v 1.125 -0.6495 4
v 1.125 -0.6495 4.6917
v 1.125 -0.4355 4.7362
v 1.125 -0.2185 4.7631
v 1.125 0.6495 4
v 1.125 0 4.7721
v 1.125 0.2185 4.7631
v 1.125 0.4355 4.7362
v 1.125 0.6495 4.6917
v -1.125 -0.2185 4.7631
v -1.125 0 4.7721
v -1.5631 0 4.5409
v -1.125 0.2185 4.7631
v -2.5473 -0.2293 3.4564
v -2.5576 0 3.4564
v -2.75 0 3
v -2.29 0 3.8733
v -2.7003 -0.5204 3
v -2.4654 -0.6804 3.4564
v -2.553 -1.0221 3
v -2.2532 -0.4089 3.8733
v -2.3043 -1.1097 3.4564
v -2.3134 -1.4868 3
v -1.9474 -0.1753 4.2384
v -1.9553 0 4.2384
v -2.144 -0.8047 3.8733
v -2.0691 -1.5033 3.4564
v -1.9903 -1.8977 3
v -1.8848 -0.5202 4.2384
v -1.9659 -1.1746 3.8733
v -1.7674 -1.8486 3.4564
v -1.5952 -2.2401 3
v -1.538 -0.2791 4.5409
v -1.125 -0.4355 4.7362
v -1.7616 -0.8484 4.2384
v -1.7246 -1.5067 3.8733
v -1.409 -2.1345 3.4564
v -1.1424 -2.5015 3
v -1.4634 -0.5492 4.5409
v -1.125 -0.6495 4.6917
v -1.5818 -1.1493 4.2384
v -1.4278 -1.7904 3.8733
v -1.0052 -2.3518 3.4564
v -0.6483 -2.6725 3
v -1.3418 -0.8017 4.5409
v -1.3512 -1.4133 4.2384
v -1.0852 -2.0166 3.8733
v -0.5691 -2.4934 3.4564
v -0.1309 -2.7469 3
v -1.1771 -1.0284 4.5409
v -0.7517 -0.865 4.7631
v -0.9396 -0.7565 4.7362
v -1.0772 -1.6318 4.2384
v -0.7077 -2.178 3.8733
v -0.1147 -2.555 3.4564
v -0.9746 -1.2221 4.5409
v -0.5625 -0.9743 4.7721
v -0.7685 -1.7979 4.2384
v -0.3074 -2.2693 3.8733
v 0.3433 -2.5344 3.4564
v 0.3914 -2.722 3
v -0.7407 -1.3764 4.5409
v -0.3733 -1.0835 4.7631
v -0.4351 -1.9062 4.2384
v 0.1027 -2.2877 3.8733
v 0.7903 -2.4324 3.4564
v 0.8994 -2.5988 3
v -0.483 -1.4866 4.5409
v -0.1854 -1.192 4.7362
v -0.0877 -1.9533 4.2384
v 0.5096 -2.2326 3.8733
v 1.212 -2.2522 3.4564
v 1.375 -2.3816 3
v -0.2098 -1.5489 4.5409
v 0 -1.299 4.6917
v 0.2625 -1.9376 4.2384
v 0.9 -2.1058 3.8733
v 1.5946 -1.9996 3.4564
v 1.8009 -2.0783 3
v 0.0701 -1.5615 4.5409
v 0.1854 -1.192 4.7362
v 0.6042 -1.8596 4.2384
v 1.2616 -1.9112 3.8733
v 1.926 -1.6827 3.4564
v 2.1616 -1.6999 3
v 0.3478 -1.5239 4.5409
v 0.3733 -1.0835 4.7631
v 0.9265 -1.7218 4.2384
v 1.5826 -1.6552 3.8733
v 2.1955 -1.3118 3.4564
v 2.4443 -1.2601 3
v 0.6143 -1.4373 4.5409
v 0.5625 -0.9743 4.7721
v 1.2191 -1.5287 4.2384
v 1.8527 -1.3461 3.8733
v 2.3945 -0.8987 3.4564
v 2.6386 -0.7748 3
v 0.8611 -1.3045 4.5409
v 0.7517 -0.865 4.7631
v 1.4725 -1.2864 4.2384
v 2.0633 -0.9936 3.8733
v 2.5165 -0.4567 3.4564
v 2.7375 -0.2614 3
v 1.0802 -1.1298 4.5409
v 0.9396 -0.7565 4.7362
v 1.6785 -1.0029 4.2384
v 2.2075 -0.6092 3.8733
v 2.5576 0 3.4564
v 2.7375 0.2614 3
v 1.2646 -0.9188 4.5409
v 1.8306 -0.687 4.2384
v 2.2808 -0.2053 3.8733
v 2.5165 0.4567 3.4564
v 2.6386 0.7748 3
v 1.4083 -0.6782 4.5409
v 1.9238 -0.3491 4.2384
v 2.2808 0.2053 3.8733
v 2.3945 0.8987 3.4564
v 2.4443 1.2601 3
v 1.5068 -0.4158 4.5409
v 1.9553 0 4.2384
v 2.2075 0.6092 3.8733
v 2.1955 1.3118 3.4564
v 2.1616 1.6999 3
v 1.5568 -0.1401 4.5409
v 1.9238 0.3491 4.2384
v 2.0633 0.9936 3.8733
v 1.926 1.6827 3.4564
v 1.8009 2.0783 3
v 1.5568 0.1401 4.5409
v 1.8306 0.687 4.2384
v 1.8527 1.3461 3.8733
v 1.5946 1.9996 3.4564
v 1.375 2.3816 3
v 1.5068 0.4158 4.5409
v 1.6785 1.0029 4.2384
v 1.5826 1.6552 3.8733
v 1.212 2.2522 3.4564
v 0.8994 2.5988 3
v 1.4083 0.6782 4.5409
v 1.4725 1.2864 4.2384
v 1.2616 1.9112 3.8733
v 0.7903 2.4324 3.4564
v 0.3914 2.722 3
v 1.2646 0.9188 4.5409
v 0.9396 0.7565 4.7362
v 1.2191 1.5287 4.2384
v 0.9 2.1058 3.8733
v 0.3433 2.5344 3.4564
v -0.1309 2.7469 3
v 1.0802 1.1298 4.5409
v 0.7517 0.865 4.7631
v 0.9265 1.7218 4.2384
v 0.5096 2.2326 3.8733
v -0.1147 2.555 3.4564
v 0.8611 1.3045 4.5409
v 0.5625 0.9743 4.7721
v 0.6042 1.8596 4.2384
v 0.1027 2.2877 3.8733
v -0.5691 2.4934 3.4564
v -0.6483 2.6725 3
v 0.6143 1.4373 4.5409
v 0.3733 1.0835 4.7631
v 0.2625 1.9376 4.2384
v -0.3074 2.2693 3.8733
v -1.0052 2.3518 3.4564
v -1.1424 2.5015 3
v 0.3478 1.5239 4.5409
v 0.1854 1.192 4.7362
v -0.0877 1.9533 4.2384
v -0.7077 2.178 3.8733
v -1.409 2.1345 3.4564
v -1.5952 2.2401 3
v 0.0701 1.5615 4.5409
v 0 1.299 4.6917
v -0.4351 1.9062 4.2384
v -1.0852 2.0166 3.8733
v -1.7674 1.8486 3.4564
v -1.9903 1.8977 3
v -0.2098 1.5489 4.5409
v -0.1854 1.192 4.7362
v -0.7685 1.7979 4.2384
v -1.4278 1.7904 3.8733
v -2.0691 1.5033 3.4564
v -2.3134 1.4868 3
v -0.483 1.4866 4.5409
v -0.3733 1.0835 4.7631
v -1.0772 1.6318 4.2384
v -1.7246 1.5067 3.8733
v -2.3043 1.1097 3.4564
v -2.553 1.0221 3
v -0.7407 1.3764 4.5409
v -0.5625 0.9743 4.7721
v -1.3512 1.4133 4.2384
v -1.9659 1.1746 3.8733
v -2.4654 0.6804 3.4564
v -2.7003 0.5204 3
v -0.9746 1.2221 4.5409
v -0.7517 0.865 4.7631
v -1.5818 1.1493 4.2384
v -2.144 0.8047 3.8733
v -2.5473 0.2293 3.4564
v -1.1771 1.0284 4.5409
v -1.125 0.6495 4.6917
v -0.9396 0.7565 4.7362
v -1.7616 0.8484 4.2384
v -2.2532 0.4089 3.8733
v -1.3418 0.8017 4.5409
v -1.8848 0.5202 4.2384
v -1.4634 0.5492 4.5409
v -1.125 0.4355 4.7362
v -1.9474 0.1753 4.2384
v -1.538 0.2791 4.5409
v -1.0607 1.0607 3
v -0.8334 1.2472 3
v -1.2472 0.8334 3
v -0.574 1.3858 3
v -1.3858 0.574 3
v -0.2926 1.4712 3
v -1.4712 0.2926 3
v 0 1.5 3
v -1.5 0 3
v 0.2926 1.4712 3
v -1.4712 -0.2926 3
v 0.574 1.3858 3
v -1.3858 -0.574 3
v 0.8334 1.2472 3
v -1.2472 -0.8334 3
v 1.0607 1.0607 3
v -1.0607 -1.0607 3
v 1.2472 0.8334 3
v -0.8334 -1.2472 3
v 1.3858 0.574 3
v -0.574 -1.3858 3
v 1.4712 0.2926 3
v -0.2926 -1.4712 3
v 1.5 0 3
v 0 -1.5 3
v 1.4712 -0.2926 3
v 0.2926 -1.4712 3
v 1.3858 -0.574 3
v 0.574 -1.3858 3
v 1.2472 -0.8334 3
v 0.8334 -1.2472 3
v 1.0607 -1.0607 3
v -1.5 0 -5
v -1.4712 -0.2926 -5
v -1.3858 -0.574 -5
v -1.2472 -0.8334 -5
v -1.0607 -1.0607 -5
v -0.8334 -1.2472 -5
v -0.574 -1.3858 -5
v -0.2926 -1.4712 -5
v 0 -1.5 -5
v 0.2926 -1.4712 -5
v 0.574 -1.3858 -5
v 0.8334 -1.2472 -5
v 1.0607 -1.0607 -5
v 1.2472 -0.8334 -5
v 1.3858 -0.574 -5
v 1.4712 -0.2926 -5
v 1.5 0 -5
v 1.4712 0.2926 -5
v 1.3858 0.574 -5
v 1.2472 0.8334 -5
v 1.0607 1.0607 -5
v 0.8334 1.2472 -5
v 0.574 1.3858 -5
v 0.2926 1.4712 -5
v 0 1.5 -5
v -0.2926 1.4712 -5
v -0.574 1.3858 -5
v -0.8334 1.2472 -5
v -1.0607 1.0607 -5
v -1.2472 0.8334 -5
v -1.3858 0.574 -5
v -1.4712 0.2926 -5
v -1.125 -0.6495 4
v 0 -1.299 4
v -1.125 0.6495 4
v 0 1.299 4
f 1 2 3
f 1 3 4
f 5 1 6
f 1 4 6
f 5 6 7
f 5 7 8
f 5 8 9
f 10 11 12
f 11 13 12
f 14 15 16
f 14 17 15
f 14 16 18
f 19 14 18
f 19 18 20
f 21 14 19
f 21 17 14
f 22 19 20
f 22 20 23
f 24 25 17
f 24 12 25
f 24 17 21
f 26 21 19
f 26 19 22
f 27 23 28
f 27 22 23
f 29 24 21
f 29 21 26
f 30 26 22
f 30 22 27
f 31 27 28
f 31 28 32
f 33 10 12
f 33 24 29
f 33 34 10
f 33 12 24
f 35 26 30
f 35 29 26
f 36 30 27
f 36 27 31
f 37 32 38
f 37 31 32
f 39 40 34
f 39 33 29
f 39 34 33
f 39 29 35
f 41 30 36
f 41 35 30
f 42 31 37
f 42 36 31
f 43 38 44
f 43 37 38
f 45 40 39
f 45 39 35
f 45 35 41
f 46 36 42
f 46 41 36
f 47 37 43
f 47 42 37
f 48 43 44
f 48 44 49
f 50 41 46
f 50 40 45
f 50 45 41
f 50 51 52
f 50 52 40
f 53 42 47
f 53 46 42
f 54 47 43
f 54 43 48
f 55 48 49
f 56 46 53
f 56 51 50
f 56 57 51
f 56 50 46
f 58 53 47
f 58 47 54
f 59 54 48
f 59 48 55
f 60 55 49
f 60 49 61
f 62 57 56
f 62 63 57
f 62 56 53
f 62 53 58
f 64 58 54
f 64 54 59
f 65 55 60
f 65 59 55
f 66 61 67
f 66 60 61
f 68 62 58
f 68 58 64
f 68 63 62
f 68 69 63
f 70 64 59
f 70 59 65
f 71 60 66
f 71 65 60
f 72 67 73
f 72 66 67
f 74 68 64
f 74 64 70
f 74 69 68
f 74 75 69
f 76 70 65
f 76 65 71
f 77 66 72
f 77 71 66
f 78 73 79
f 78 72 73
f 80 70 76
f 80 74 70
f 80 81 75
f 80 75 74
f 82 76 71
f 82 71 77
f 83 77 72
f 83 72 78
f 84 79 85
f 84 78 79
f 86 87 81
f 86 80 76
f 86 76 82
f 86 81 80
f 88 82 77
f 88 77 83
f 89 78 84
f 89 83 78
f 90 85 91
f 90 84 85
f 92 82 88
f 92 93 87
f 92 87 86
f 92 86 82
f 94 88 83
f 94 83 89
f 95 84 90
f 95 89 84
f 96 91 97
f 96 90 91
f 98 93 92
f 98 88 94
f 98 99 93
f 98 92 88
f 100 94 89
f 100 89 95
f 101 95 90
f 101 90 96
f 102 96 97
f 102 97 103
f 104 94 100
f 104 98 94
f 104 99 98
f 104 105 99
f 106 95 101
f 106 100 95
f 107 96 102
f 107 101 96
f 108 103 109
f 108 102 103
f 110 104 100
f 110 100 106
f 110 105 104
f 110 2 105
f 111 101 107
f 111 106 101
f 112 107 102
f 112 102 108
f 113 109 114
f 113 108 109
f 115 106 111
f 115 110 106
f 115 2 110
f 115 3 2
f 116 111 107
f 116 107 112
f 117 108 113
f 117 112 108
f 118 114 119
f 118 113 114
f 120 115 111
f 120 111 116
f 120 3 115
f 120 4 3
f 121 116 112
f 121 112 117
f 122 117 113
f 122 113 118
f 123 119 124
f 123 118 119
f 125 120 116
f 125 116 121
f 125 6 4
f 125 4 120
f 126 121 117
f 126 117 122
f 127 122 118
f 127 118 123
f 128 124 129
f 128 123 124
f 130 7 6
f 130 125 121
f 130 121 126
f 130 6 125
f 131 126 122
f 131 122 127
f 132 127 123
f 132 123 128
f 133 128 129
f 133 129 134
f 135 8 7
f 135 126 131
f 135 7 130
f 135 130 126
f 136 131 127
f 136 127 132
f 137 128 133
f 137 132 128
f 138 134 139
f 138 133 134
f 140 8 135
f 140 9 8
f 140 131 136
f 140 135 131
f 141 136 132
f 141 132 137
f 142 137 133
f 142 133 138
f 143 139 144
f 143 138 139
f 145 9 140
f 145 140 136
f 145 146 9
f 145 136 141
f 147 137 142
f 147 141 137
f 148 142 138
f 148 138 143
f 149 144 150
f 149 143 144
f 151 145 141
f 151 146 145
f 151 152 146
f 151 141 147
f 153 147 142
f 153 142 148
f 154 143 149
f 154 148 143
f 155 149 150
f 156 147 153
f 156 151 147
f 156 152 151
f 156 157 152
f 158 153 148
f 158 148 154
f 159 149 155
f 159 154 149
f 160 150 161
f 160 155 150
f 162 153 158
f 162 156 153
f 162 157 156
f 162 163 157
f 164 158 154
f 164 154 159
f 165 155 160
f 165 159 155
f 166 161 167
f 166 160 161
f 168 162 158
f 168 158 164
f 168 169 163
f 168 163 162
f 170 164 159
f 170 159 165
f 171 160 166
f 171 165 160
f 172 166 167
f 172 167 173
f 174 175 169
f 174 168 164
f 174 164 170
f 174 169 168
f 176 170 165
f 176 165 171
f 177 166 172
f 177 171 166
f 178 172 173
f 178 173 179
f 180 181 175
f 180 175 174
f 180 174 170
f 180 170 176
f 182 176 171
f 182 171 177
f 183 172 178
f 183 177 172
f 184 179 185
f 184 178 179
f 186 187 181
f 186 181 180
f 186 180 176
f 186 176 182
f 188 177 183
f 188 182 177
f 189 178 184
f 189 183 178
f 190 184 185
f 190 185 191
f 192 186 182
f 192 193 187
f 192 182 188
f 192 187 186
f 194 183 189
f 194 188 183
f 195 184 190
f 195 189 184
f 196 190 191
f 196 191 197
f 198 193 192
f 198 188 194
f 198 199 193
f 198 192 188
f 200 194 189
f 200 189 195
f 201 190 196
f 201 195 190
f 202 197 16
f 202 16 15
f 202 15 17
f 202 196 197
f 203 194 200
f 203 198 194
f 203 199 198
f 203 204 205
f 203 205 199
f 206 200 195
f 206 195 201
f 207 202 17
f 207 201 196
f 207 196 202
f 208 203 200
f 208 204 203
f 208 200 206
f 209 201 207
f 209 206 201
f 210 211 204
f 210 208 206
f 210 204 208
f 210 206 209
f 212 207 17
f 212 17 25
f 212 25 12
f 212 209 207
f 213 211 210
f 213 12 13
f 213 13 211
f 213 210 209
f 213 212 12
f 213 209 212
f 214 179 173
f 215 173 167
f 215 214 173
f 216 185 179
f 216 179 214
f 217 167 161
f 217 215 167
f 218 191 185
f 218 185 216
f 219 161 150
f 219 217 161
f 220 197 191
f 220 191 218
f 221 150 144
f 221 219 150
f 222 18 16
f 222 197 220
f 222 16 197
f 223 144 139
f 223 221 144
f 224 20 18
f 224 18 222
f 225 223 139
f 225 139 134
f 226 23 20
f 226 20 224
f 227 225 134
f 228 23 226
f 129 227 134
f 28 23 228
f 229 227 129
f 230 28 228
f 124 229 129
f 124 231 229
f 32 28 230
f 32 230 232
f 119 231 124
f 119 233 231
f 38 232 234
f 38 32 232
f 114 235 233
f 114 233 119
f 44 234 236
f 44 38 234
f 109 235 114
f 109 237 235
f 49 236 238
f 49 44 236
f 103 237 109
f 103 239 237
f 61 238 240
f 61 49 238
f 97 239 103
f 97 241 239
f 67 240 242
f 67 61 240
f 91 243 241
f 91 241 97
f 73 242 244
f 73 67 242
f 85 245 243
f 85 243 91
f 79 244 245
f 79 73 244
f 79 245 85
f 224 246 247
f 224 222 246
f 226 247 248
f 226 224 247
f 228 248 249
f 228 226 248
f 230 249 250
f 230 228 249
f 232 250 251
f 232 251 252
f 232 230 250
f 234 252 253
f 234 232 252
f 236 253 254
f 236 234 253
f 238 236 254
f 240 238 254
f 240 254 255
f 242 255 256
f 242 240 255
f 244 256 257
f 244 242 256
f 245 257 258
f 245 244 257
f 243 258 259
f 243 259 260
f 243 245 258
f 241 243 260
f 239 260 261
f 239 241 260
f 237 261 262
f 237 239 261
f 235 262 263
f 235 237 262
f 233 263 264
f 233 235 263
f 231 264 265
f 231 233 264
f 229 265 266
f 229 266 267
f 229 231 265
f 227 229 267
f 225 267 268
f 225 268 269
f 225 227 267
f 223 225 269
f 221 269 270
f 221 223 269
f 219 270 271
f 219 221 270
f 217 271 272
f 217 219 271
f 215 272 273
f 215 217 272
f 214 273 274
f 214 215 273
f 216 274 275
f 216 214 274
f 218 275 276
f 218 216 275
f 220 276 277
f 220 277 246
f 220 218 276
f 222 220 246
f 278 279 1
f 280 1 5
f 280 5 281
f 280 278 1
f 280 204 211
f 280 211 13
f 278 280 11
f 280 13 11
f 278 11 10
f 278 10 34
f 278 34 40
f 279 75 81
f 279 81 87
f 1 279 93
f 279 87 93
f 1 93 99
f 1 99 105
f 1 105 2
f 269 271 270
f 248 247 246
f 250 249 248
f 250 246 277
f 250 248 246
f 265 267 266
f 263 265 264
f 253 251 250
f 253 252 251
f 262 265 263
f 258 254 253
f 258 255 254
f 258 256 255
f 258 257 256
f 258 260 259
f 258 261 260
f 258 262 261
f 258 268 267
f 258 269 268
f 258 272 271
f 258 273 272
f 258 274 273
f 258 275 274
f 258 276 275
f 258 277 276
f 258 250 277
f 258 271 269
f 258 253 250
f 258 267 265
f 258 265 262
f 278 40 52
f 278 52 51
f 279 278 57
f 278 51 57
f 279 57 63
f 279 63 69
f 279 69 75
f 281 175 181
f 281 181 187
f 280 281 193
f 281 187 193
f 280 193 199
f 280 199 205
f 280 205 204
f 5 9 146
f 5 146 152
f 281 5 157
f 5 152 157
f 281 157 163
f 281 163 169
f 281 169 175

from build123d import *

# Parameters (mm, degrees)
CUT_EXTRUDE1_START = 5
CUT_EXTRUDE1_DEPTH = 1


with BuildPart() as part:
    # Sketch1 → Revolve1 (revolve)
    with BuildSketch(Plane.YZ, mode=Mode.PRIVATE) as revolve1_sk:
        with BuildLine():
            Line((0, -5), (1.5, -5))
            Line((1.5, -5), (1.5, 3))
            Line((1.5, 3), (2.75, 3))
            ThreePointArc((2.75, 3), (1.700183814, 4.447127744), (0, 5))
            Line((0, 5), (0, 3))
            Line((0, 3), (0, -5))
        make_face()
    revolve(revolve1_sk.sketch.rotate(Axis((0, 0, 3), (0, 0, 1)), 90), axis=Axis((0, 0, 3), (0, 0, 1)))

    # Sketch2 → Cut-Extrude1 (cut)
    with BuildSketch(Plane(origin=(0, 0, 0), x_dir=(0, 1, 0), z_dir=(0, 0, 1)).offset(CUT_EXTRUDE1_START)):
        Polygon((1.299038106, 0), (0.649519053, 1.125), (-0.649519053, 1.125), (-1.299038106, 0), (-0.649519053, -1.125), (0.649519053, -1.125), align=None)
    extrude(amount=-CUT_EXTRUDE1_DEPTH, mode=Mode.SUBTRACT)


solid = part.part
